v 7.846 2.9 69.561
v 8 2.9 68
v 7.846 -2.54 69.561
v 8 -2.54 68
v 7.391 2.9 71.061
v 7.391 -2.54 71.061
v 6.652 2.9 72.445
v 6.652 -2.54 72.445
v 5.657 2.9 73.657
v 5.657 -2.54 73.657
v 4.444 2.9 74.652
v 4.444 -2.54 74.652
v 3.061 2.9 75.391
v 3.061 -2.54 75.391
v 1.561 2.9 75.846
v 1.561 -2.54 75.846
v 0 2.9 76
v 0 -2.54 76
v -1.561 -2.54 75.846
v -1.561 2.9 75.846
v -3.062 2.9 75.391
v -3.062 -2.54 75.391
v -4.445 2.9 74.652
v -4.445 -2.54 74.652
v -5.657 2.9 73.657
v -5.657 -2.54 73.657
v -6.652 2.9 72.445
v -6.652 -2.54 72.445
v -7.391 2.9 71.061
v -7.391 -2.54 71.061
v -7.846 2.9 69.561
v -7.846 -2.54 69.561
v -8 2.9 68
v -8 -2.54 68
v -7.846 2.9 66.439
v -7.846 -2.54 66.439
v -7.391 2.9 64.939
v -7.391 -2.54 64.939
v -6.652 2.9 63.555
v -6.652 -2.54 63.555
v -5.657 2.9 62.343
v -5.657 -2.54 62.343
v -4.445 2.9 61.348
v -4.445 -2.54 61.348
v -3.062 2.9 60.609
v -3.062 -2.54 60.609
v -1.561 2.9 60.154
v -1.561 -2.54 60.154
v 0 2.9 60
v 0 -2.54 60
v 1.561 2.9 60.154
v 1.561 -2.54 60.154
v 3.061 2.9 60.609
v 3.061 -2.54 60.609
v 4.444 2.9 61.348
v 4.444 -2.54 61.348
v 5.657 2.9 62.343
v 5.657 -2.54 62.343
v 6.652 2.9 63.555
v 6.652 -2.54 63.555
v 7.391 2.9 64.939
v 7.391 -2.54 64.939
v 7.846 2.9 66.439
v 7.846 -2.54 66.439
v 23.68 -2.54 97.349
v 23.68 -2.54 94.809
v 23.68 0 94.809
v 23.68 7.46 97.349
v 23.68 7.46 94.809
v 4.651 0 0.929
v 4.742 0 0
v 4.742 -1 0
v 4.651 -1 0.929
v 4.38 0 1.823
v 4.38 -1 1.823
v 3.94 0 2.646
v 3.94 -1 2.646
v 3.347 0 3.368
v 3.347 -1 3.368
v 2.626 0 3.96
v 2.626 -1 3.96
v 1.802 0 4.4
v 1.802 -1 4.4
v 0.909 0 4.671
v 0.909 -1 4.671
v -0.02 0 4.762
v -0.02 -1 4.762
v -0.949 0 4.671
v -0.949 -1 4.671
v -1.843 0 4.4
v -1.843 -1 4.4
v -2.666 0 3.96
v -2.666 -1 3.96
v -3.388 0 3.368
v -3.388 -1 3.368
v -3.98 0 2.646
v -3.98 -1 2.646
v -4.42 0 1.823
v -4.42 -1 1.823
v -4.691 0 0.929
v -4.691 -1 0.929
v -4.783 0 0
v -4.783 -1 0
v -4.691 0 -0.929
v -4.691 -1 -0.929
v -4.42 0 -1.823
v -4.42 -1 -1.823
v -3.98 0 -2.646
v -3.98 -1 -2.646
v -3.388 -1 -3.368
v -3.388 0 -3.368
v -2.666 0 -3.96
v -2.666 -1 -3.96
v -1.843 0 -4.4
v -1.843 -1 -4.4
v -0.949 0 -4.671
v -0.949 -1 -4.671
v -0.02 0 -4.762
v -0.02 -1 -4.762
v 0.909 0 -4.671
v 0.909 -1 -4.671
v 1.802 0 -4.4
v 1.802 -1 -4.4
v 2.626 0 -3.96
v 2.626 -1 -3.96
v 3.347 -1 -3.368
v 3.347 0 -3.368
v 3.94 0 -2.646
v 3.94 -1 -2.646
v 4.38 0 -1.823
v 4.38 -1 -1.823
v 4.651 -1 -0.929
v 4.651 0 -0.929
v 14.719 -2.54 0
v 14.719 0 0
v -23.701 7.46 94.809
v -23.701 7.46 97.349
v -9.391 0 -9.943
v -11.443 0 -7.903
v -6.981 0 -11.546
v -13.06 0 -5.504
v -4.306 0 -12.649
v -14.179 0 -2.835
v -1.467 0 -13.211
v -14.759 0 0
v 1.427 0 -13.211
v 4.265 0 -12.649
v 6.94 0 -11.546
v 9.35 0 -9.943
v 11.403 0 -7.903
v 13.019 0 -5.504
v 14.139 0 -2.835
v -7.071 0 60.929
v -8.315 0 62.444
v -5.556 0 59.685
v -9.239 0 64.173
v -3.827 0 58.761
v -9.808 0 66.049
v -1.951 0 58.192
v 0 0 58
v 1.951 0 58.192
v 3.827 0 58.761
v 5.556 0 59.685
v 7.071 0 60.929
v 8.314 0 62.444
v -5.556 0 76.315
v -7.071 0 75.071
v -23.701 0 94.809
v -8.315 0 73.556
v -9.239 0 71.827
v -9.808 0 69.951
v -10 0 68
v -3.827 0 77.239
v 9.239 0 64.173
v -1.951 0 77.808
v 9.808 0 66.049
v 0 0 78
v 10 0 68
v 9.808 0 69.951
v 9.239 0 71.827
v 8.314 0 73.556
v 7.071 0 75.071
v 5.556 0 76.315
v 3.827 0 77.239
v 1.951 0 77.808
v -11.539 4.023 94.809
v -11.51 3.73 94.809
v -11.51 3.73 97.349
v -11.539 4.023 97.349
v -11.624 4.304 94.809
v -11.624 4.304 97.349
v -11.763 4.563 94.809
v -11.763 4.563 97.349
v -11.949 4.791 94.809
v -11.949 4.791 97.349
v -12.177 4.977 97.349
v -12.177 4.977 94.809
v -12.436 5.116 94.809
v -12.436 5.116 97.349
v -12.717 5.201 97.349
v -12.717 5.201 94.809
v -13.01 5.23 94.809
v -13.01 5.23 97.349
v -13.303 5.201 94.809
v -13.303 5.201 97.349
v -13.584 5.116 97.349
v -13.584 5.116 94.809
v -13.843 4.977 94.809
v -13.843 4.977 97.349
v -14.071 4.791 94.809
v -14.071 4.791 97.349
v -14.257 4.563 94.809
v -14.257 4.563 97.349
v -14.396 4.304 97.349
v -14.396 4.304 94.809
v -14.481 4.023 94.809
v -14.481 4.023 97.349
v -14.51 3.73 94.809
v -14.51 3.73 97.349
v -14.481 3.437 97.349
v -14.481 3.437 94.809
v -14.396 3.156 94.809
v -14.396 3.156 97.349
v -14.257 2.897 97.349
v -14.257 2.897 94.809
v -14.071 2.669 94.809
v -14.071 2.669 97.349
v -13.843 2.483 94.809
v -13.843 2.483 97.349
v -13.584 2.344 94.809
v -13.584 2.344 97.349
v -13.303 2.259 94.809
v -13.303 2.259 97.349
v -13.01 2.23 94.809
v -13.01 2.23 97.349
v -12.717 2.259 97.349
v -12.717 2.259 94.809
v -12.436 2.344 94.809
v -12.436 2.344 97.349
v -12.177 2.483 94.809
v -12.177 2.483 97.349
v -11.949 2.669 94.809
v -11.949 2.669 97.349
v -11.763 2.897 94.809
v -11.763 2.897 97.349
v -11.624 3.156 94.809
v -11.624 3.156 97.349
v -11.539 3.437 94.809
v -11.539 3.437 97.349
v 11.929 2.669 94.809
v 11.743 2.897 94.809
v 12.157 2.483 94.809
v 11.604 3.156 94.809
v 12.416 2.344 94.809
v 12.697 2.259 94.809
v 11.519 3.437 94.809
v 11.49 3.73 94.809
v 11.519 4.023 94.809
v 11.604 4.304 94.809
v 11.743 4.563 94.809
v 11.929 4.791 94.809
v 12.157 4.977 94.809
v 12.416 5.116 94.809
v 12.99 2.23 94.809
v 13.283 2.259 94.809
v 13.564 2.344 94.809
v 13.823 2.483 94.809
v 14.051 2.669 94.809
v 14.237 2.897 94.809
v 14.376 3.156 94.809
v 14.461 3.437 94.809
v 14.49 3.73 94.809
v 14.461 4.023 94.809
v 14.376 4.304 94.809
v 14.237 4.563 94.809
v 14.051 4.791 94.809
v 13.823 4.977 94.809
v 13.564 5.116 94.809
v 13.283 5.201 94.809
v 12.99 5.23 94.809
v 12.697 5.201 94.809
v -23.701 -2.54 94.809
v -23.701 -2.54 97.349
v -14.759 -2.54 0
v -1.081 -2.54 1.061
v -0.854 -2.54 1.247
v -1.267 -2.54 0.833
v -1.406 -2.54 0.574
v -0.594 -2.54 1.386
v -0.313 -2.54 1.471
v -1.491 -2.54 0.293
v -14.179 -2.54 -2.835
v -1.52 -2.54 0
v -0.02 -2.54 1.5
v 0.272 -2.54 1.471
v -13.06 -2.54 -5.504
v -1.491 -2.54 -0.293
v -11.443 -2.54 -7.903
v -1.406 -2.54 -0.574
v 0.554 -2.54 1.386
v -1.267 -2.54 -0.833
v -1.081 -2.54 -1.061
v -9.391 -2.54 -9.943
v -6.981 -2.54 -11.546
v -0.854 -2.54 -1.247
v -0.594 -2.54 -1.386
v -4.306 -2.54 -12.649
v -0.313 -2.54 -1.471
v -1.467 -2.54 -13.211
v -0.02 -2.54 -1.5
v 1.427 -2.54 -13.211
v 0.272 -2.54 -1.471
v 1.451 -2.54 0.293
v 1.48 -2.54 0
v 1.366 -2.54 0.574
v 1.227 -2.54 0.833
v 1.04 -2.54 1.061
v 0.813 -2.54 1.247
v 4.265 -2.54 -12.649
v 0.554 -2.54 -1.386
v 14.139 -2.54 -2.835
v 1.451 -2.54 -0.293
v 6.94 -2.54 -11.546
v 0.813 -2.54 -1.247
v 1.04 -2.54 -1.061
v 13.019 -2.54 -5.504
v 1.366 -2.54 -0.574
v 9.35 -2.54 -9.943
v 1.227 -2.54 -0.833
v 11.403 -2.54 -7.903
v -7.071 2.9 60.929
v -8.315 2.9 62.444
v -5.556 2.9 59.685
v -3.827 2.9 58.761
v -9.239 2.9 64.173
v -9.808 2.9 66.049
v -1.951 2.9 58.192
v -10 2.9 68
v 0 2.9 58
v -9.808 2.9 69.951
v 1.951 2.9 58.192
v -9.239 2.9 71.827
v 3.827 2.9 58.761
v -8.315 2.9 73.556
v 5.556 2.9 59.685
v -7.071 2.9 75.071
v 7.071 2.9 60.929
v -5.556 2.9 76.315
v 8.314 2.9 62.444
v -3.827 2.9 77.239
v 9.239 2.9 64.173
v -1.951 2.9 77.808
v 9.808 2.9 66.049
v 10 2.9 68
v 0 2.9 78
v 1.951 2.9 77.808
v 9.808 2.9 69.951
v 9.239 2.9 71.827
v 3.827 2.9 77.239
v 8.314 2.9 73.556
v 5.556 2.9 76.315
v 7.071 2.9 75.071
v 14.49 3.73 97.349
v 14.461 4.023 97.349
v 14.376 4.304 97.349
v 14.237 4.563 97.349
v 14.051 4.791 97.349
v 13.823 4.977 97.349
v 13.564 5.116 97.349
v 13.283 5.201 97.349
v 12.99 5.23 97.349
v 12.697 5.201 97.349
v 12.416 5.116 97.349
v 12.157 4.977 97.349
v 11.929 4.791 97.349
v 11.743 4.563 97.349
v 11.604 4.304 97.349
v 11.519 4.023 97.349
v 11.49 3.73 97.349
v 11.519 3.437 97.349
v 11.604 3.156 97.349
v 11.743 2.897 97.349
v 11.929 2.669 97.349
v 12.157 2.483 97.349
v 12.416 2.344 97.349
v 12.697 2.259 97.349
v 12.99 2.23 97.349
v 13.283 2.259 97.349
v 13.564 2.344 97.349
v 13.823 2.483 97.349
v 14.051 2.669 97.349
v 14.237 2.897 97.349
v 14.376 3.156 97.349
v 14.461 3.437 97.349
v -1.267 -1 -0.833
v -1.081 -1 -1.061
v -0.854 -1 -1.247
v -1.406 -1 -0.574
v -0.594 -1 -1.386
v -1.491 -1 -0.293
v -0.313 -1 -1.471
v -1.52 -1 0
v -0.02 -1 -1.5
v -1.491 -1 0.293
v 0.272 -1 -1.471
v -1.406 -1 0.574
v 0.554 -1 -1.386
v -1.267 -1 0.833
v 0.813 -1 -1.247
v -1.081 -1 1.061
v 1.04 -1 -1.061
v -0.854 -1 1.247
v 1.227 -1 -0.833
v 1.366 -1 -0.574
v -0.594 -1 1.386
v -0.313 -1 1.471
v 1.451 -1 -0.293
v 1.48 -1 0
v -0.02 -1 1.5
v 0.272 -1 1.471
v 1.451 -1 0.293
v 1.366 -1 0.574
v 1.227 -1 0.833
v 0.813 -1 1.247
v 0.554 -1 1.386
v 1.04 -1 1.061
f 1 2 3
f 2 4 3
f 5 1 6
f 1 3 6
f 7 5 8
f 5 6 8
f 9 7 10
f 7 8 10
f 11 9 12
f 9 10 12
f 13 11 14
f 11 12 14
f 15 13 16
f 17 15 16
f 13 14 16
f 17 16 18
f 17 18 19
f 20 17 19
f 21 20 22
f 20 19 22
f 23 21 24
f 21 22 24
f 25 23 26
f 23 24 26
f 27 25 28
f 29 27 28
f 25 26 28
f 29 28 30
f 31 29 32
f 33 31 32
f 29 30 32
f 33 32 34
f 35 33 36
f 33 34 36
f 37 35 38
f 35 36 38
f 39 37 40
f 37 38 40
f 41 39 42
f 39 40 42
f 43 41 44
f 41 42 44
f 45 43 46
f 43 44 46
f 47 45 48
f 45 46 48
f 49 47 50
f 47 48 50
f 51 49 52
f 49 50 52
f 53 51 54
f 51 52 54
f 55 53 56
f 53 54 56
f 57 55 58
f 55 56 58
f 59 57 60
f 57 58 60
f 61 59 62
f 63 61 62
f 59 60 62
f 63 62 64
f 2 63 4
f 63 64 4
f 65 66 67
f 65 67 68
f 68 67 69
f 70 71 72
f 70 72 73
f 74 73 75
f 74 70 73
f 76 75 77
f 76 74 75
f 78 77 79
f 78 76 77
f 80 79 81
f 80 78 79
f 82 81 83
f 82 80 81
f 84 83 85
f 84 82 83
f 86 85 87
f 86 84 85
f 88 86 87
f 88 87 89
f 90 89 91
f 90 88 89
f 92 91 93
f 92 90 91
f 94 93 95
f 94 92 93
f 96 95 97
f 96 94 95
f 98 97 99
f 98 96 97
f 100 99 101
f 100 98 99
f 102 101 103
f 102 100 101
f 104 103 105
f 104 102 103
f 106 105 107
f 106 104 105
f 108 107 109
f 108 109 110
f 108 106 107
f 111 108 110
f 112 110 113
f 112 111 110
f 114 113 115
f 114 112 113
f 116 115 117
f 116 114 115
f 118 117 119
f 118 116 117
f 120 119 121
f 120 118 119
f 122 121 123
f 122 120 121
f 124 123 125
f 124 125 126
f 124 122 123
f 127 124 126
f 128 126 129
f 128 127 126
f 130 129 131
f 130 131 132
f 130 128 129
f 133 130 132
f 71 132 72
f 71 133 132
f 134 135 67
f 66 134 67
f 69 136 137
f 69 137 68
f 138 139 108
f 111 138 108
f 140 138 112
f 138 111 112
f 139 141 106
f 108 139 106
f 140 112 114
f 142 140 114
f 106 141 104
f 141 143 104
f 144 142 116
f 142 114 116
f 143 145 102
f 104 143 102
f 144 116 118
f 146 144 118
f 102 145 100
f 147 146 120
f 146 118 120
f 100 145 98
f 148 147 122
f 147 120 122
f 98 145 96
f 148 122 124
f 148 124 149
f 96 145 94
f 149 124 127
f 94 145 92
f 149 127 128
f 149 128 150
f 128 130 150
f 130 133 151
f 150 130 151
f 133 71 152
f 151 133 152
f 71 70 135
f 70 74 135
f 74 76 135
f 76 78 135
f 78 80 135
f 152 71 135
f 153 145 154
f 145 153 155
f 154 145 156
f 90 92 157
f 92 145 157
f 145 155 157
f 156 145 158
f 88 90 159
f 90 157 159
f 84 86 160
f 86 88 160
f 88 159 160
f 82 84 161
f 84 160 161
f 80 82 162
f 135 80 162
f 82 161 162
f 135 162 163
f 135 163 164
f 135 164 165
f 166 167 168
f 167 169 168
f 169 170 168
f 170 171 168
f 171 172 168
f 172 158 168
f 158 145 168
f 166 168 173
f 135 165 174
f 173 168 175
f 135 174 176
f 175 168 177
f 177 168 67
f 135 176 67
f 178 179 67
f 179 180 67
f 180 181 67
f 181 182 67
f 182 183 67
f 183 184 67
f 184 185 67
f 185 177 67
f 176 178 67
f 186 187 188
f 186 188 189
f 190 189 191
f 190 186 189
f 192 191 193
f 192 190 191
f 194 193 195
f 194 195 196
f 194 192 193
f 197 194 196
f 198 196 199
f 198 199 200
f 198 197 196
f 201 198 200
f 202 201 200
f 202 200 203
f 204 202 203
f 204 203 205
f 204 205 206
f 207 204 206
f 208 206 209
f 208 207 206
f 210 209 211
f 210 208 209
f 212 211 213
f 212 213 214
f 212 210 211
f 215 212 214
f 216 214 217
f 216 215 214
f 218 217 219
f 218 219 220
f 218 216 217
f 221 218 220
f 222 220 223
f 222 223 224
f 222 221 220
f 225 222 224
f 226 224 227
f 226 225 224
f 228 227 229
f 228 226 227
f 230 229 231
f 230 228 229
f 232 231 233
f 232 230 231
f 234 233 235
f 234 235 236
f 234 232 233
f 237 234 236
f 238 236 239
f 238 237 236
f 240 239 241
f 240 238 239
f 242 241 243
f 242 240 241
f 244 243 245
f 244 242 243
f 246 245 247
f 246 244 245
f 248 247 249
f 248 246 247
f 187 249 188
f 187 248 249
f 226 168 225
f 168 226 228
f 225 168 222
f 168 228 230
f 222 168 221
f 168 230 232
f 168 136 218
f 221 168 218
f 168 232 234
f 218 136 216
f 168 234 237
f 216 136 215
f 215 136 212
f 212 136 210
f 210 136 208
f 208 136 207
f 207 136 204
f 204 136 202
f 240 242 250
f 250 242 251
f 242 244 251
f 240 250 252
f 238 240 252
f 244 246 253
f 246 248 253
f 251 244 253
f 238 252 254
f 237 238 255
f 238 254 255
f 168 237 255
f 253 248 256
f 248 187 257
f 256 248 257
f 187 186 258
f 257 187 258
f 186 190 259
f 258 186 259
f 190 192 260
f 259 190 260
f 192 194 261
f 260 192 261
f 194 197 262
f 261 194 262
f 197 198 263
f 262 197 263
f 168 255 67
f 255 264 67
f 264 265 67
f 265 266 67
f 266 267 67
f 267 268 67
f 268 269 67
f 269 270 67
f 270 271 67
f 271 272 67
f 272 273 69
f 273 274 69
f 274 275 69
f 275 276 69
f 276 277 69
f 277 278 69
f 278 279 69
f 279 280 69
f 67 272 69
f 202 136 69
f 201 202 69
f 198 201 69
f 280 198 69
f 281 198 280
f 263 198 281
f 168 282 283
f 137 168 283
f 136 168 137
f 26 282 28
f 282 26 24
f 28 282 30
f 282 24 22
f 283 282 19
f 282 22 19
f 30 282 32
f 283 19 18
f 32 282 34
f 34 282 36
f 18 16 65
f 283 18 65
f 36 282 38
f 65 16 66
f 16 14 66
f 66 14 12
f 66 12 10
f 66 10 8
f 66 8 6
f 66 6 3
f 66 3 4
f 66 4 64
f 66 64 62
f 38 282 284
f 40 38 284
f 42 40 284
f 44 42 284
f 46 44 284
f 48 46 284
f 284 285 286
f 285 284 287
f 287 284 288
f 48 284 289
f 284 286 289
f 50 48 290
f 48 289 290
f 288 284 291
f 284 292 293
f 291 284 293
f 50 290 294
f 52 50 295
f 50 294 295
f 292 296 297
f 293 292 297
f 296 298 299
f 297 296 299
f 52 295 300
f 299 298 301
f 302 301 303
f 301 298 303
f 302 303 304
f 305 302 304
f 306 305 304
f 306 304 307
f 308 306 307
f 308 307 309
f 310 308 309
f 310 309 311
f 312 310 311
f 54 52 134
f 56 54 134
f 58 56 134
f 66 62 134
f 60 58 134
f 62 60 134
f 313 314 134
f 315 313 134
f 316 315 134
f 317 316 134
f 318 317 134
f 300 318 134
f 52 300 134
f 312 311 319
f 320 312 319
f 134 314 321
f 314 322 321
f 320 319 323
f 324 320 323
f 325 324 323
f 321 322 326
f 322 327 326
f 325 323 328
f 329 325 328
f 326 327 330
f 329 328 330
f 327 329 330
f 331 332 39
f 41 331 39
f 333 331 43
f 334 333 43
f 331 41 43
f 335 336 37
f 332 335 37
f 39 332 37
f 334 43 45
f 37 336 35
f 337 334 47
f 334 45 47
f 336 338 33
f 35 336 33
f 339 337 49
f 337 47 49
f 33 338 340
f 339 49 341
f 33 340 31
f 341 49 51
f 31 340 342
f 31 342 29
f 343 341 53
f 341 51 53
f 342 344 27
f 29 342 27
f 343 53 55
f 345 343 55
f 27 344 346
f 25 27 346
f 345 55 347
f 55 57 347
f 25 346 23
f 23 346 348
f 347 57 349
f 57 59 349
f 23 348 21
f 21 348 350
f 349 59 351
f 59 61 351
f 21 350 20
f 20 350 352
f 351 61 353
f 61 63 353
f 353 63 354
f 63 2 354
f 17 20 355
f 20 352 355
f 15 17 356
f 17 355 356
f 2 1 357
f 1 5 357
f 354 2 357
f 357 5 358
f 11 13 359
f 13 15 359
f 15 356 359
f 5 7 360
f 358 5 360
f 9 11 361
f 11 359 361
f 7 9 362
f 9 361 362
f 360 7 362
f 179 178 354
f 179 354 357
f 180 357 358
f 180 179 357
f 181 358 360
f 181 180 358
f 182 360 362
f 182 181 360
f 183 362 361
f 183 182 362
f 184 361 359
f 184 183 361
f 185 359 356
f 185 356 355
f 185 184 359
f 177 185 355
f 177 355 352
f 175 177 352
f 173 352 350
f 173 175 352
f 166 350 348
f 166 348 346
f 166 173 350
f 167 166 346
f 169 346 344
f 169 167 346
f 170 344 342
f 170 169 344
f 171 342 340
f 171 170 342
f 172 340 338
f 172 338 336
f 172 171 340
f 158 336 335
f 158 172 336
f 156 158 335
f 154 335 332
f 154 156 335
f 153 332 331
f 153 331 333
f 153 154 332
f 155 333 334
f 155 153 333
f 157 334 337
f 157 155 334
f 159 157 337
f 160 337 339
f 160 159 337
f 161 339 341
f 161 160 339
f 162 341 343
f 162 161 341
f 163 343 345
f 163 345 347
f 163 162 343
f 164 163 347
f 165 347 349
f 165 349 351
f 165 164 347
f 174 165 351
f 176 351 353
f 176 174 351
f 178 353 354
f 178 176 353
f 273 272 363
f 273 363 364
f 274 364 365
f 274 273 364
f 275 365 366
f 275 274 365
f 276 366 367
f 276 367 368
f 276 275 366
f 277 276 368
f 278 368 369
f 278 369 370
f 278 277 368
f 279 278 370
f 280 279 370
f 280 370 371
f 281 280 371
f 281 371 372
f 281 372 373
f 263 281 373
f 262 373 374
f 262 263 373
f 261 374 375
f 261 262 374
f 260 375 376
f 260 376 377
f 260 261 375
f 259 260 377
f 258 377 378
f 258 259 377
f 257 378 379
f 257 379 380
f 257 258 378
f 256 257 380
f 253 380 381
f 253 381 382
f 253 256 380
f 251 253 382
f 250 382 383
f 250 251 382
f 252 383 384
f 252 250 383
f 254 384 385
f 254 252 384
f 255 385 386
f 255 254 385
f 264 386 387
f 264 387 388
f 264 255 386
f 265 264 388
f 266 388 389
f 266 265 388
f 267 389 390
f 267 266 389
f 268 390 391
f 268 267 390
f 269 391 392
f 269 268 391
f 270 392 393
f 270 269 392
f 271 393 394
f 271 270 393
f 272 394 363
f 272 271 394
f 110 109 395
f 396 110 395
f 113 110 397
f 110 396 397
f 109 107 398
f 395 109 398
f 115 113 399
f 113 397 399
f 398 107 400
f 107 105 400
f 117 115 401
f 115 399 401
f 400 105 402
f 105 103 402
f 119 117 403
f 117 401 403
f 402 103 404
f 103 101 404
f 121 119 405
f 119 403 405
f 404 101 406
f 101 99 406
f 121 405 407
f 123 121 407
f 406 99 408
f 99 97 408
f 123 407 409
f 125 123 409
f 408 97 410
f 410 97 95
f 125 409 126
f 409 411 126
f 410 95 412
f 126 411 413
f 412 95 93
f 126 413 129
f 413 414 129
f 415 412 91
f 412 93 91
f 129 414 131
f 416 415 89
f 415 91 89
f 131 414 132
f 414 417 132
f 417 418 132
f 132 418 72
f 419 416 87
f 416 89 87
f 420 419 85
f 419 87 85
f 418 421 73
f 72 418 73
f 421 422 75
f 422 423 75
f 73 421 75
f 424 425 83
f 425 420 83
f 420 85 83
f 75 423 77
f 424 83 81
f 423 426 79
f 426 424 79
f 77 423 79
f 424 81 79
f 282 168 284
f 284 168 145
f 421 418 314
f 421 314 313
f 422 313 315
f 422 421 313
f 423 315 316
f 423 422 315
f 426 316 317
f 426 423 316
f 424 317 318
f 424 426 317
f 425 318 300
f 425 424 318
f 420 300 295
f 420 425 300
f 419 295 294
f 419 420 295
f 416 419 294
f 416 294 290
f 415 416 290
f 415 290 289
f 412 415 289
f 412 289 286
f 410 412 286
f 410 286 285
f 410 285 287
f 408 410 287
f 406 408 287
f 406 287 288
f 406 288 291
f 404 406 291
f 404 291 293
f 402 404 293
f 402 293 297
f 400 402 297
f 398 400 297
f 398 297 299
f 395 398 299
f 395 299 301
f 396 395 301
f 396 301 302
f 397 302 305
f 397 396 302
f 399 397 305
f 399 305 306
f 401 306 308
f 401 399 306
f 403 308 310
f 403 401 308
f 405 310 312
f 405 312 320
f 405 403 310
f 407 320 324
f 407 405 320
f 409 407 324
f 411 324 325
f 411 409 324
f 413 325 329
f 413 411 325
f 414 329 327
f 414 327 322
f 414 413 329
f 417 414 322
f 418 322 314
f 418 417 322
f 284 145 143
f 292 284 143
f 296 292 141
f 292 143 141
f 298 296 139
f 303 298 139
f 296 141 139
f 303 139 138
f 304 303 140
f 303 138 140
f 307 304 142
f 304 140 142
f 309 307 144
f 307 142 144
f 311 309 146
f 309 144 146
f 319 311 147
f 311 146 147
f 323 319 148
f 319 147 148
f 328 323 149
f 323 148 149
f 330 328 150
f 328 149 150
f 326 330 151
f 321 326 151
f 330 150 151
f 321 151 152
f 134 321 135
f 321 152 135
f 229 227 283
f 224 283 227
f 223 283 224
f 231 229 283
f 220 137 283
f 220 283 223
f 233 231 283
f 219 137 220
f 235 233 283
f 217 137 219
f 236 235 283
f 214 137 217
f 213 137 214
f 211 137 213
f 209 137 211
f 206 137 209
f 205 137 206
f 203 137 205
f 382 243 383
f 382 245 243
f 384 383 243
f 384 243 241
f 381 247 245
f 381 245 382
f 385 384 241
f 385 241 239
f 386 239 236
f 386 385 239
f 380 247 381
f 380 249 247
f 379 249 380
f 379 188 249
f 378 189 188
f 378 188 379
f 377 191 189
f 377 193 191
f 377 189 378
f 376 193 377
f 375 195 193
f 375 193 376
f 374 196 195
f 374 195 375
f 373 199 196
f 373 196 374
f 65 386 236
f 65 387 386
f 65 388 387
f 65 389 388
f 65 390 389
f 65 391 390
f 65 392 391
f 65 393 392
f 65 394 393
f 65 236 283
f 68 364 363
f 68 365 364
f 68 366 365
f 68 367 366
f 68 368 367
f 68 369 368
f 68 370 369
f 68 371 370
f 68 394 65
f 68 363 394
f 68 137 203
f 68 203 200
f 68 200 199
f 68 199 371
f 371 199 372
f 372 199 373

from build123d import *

# Parameters (mm, degrees)
SKETCH2_R           = 1.5
SKETCH2_R_2         = 8
BOSS_EXTRUDE3_DEPTH = 2.54
SKETCH3_W           = 47.380920583
SKETCH3_H           = 10
SKETCH3_R           = 1.5
BOSS_EXTRUDE6_DEPTH = 2.54
SKETCH2_6_R         = 4.7625
SKETCH2_6_R_2       = 1.5
SKETCH2_6_R_3       = 8
SKETCH2_6_R_4       = 6.5
CUT_EXTRUDE2_DEPTH  = 1
SKETCH2_8_R         = 10
SKETCH2_8_R_2       = 8
BOSS_EXTRUDE7_DEPTH = 2.9


with BuildPart() as part:
    # Sketch2 → Boss-Extrude3 (new body)
    with BuildSketch(Plane.XZ):
        with BuildLine():
            Line((14.71851466, 0), (23.68035712, 94.809011723))
            Line((23.68035712, 94.809011723), (-23.700563463, 94.809011723))
            Line((-23.700563463, 94.809011723), (-14.758927346, 0))
            ThreePointArc((-14.758927346, 0), (-0.020206343, -13.282171548), (14.71851466, 0))
        make_face()
        with Locations((-0.020206343, 0)):
            Circle(SKETCH2_R, mode=Mode.SUBTRACT)
        with Locations((-0.000200837, 67.999997057)):
            Circle(SKETCH2_R_2, mode=Mode.SUBTRACT)
    extrude(amount=BOSS_EXTRUDE3_DEPTH)

    # Sketch3 → Boss-Extrude6 (add)
    with BuildSketch(Plane.XY.offset(94.809011723)):
        with Locations((-0.010103172, 2.46)):
            Rectangle(SKETCH3_W, SKETCH3_H)
        with Locations((-13.010103172, 3.73)):
            Circle(SKETCH3_R, mode=Mode.SUBTRACT)
        with Locations((12.989896828, 3.73)):
            Circle(SKETCH3_R, mode=Mode.SUBTRACT)
    extrude(amount=BOSS_EXTRUDE6_DEPTH)

    # Sketch2<6> → Cut-Extrude2 (cut)
    with BuildSketch(Plane.XZ):
        with Locations((-0.020206343, 0)):
            Circle(SKETCH2_6_R)
        with Locations((-0.020206343, 0)):
            Circle(SKETCH2_6_R_2, mode=Mode.SUBTRACT)
        with Locations((-0.000200837, 67.999997057)):
            Circle(SKETCH2_6_R_3)
        with Locations((-0.000200837, 67.999997057)):
            Circle(SKETCH2_6_R_4, mode=Mode.SUBTRACT)
    extrude(amount=CUT_EXTRUDE2_DEPTH, mode=Mode.SUBTRACT)

    # Sketch2<8> → Boss-Extrude7 (add)
    with BuildSketch(Plane.XZ):
        with Locations((-0.000200837, 67.999997057)):
            Circle(SKETCH2_8_R)
        with Locations((-0.000200837, 67.999997057)):
            Circle(SKETCH2_8_R_2, mode=Mode.SUBTRACT)
    extrude(amount=-BOSS_EXTRUDE7_DEPTH)


solid = part.part
